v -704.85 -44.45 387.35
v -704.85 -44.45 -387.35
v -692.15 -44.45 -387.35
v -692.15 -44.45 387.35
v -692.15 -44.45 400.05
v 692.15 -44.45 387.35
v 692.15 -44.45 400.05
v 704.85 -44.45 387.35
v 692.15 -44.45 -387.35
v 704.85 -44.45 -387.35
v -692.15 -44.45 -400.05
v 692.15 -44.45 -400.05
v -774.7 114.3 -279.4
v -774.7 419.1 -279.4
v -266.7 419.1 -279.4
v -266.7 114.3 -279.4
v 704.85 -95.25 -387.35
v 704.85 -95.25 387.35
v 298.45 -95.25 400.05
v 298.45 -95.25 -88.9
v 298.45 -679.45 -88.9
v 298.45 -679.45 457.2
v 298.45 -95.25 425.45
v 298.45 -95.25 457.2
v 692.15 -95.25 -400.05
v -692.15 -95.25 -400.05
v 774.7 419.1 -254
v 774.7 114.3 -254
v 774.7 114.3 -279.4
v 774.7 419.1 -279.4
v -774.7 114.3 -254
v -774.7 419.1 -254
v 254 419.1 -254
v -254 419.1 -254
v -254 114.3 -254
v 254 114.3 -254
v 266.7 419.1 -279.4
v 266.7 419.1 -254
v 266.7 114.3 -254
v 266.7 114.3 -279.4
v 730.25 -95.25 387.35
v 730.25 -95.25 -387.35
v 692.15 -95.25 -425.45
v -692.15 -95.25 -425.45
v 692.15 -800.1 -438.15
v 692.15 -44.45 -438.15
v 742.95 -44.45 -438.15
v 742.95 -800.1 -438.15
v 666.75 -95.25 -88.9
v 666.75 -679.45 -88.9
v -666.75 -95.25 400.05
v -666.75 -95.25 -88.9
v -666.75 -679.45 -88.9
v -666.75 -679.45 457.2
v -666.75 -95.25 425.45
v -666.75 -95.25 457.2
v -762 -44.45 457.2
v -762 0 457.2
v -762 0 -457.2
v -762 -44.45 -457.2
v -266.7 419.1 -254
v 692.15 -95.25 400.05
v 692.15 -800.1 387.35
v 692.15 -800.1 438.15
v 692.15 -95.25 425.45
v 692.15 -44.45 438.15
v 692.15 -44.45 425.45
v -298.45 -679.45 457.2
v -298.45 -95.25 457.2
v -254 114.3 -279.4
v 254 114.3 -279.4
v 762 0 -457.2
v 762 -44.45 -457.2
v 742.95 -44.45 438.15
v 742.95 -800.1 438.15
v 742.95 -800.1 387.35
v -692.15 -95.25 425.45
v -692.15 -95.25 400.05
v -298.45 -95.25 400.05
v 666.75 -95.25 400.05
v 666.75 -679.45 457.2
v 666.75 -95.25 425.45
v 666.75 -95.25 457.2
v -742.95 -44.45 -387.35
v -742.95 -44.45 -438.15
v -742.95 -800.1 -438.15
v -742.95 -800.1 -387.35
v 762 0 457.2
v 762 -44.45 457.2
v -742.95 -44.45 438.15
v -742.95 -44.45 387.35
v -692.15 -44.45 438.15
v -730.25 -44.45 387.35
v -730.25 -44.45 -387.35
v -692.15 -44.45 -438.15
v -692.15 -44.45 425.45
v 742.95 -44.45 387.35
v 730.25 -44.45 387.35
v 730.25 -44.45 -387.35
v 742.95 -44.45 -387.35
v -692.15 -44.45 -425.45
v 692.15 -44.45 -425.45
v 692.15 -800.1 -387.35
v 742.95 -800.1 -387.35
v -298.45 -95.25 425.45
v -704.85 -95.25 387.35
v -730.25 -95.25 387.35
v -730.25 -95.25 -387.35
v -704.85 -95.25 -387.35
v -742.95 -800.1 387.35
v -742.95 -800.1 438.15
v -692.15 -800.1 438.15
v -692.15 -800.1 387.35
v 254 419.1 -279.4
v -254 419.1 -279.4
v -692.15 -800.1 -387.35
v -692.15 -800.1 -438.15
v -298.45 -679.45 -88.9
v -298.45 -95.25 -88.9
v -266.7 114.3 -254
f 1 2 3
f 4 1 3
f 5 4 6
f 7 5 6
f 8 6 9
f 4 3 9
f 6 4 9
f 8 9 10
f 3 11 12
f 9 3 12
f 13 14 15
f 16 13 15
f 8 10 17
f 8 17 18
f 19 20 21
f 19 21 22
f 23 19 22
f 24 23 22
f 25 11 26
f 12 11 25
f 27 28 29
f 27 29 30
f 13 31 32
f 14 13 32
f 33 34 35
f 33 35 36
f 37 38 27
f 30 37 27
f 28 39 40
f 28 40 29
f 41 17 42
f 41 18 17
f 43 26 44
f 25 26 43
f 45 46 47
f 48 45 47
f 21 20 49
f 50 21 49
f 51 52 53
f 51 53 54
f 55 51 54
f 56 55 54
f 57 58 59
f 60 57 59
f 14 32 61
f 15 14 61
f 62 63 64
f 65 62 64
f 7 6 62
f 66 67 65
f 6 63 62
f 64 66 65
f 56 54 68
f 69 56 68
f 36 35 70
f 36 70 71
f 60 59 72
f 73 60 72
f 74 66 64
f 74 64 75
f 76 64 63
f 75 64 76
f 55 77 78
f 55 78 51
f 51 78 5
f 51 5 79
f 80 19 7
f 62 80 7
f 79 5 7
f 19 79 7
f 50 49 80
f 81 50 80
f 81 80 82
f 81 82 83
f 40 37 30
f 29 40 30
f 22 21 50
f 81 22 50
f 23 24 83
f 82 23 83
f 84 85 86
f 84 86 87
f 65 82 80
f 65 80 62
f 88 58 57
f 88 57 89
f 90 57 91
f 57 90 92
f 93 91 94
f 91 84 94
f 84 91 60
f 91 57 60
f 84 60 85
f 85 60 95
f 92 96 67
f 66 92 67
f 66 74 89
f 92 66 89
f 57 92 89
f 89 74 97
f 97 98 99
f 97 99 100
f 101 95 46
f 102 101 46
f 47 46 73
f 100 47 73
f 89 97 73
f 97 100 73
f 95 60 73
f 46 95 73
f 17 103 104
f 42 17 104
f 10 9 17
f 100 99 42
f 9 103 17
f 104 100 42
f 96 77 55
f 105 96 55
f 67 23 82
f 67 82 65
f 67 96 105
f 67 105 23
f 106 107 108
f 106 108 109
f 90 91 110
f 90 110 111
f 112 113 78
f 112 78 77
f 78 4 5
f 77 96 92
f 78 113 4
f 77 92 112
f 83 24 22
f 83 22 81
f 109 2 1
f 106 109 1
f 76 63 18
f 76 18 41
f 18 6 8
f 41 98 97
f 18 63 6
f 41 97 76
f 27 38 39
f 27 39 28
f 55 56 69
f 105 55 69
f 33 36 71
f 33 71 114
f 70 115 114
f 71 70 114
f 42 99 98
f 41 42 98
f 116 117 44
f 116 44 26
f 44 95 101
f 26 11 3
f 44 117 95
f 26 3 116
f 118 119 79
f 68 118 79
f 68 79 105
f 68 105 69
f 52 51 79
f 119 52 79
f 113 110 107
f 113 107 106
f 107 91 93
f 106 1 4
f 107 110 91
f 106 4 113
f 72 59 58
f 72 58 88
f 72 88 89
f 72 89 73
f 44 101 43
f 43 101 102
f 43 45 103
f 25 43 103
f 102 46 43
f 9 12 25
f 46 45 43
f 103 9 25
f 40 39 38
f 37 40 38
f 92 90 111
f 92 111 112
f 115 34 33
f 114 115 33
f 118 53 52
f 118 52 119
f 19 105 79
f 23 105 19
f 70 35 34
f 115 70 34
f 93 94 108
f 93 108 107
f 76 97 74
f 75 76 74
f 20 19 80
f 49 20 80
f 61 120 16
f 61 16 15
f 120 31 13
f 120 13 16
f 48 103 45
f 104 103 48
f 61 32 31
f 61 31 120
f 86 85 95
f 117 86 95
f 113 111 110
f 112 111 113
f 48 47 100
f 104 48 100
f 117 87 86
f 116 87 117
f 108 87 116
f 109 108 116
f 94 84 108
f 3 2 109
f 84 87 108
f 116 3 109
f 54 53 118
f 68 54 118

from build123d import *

# Parameters (mm, degrees)
SKETCH1_W             = 1524
SKETCH1_H             = 914.4
BOSS_EXTRUDE1_DEPTH   = 44.45
SKETCH2_W             = 50.8
SKETCH2_H             = 50.8
BOSS_EXTRUDE2_DEPTH   = 755.65
SKETCH3_W             = 1460.5
SKETCH3_H             = 850.9
SKETCH3_W_2           = 1409.7
SKETCH3_H_2           = 800.1
BOSS_EXTRUDE3_DEPTH   = 50.8
SKETCH4_W             = 368.3
SKETCH4_H             = 546.1
BOSS_EXTRUDE4_DEPTH   = 584.2
SKETCH5_W             = 508
SKETCH5_H             = 304.8
BOSS_EXTRUDE5_DEPTH   = 25.4
BOSS_EXTRUDE5_2_DEPTH = 25.4
BOSS_EXTRUDE5_3_DEPTH = 25.4


with BuildPart() as part:
    # Sketch1 → Boss-Extrude1 (new body)
    with BuildSketch(Plane(origin=(0, 0, 0), x_dir=(1, 0, 0), z_dir=(0, 1, 0))):
        Rectangle(SKETCH1_W, SKETCH1_H)
    extrude(amount=-BOSS_EXTRUDE1_DEPTH)

    # Sketch2 → Boss-Extrude2 (add)
    with BuildSketch(Plane.XZ.offset(44.45)):
        with Locations((717.55, 412.75)):
            Rectangle(SKETCH2_W, SKETCH2_H)
        with Locations((717.55, -412.75)):
            Rectangle(SKETCH2_W, SKETCH2_H)
        with Locations((-717.55, -412.75)):
            Rectangle(SKETCH2_W, SKETCH2_H)
        with Locations((-717.55, 412.75)):
            Rectangle(SKETCH2_W, SKETCH2_H)
    extrude(amount=BOSS_EXTRUDE2_DEPTH)

    # Sketch3 → Boss-Extrude3 (add)
    with BuildSketch(Plane.XZ.offset(44.45)):
        Rectangle(SKETCH3_W, SKETCH3_H)
        Rectangle(SKETCH3_W_2, SKETCH3_H_2, mode=Mode.SUBTRACT)
    extrude(amount=BOSS_EXTRUDE3_DEPTH)

    # Sketch4 → Boss-Extrude4 (add)
    with BuildSketch(Plane.XZ.offset(95.25)):
        with Locations((-482.6, 184.15)):
            Rectangle(SKETCH4_W, SKETCH4_H)
        with Locations((482.6, 184.15)):
            Rectangle(SKETCH4_W, SKETCH4_H)
    extrude(amount=BOSS_EXTRUDE4_DEPTH)


with BuildPart() as body_2:
    # Sketch5 → Boss-Extrude5 (new body)
    with BuildSketch(Plane.XY.offset(-254)):
        with Locations((-520.7, 266.7)):
            Rectangle(SKETCH5_W, SKETCH5_H)
    extrude(amount=-BOSS_EXTRUDE5_DEPTH)


with BuildPart() as body_3:
    # Sketch5 → Boss-Extrude5 2 (new body)
    with BuildSketch(Plane.XY.offset(-254)):
        with Locations((0, 266.7)):
            Rectangle(SKETCH5_W, SKETCH5_H)
    extrude(amount=-BOSS_EXTRUDE5_2_DEPTH)


with BuildPart() as body_4:
    # Sketch5 → Boss-Extrude5 3 (new body)
    with BuildSketch(Plane.XY.offset(-254)):
        with Locations((520.7, 266.7)):
            Rectangle(SKETCH5_W, SKETCH5_H)
    extrude(amount=-BOSS_EXTRUDE5_3_DEPTH)


solid = Compound([part.part, body_2.part, body_3.part, body_4.part])
